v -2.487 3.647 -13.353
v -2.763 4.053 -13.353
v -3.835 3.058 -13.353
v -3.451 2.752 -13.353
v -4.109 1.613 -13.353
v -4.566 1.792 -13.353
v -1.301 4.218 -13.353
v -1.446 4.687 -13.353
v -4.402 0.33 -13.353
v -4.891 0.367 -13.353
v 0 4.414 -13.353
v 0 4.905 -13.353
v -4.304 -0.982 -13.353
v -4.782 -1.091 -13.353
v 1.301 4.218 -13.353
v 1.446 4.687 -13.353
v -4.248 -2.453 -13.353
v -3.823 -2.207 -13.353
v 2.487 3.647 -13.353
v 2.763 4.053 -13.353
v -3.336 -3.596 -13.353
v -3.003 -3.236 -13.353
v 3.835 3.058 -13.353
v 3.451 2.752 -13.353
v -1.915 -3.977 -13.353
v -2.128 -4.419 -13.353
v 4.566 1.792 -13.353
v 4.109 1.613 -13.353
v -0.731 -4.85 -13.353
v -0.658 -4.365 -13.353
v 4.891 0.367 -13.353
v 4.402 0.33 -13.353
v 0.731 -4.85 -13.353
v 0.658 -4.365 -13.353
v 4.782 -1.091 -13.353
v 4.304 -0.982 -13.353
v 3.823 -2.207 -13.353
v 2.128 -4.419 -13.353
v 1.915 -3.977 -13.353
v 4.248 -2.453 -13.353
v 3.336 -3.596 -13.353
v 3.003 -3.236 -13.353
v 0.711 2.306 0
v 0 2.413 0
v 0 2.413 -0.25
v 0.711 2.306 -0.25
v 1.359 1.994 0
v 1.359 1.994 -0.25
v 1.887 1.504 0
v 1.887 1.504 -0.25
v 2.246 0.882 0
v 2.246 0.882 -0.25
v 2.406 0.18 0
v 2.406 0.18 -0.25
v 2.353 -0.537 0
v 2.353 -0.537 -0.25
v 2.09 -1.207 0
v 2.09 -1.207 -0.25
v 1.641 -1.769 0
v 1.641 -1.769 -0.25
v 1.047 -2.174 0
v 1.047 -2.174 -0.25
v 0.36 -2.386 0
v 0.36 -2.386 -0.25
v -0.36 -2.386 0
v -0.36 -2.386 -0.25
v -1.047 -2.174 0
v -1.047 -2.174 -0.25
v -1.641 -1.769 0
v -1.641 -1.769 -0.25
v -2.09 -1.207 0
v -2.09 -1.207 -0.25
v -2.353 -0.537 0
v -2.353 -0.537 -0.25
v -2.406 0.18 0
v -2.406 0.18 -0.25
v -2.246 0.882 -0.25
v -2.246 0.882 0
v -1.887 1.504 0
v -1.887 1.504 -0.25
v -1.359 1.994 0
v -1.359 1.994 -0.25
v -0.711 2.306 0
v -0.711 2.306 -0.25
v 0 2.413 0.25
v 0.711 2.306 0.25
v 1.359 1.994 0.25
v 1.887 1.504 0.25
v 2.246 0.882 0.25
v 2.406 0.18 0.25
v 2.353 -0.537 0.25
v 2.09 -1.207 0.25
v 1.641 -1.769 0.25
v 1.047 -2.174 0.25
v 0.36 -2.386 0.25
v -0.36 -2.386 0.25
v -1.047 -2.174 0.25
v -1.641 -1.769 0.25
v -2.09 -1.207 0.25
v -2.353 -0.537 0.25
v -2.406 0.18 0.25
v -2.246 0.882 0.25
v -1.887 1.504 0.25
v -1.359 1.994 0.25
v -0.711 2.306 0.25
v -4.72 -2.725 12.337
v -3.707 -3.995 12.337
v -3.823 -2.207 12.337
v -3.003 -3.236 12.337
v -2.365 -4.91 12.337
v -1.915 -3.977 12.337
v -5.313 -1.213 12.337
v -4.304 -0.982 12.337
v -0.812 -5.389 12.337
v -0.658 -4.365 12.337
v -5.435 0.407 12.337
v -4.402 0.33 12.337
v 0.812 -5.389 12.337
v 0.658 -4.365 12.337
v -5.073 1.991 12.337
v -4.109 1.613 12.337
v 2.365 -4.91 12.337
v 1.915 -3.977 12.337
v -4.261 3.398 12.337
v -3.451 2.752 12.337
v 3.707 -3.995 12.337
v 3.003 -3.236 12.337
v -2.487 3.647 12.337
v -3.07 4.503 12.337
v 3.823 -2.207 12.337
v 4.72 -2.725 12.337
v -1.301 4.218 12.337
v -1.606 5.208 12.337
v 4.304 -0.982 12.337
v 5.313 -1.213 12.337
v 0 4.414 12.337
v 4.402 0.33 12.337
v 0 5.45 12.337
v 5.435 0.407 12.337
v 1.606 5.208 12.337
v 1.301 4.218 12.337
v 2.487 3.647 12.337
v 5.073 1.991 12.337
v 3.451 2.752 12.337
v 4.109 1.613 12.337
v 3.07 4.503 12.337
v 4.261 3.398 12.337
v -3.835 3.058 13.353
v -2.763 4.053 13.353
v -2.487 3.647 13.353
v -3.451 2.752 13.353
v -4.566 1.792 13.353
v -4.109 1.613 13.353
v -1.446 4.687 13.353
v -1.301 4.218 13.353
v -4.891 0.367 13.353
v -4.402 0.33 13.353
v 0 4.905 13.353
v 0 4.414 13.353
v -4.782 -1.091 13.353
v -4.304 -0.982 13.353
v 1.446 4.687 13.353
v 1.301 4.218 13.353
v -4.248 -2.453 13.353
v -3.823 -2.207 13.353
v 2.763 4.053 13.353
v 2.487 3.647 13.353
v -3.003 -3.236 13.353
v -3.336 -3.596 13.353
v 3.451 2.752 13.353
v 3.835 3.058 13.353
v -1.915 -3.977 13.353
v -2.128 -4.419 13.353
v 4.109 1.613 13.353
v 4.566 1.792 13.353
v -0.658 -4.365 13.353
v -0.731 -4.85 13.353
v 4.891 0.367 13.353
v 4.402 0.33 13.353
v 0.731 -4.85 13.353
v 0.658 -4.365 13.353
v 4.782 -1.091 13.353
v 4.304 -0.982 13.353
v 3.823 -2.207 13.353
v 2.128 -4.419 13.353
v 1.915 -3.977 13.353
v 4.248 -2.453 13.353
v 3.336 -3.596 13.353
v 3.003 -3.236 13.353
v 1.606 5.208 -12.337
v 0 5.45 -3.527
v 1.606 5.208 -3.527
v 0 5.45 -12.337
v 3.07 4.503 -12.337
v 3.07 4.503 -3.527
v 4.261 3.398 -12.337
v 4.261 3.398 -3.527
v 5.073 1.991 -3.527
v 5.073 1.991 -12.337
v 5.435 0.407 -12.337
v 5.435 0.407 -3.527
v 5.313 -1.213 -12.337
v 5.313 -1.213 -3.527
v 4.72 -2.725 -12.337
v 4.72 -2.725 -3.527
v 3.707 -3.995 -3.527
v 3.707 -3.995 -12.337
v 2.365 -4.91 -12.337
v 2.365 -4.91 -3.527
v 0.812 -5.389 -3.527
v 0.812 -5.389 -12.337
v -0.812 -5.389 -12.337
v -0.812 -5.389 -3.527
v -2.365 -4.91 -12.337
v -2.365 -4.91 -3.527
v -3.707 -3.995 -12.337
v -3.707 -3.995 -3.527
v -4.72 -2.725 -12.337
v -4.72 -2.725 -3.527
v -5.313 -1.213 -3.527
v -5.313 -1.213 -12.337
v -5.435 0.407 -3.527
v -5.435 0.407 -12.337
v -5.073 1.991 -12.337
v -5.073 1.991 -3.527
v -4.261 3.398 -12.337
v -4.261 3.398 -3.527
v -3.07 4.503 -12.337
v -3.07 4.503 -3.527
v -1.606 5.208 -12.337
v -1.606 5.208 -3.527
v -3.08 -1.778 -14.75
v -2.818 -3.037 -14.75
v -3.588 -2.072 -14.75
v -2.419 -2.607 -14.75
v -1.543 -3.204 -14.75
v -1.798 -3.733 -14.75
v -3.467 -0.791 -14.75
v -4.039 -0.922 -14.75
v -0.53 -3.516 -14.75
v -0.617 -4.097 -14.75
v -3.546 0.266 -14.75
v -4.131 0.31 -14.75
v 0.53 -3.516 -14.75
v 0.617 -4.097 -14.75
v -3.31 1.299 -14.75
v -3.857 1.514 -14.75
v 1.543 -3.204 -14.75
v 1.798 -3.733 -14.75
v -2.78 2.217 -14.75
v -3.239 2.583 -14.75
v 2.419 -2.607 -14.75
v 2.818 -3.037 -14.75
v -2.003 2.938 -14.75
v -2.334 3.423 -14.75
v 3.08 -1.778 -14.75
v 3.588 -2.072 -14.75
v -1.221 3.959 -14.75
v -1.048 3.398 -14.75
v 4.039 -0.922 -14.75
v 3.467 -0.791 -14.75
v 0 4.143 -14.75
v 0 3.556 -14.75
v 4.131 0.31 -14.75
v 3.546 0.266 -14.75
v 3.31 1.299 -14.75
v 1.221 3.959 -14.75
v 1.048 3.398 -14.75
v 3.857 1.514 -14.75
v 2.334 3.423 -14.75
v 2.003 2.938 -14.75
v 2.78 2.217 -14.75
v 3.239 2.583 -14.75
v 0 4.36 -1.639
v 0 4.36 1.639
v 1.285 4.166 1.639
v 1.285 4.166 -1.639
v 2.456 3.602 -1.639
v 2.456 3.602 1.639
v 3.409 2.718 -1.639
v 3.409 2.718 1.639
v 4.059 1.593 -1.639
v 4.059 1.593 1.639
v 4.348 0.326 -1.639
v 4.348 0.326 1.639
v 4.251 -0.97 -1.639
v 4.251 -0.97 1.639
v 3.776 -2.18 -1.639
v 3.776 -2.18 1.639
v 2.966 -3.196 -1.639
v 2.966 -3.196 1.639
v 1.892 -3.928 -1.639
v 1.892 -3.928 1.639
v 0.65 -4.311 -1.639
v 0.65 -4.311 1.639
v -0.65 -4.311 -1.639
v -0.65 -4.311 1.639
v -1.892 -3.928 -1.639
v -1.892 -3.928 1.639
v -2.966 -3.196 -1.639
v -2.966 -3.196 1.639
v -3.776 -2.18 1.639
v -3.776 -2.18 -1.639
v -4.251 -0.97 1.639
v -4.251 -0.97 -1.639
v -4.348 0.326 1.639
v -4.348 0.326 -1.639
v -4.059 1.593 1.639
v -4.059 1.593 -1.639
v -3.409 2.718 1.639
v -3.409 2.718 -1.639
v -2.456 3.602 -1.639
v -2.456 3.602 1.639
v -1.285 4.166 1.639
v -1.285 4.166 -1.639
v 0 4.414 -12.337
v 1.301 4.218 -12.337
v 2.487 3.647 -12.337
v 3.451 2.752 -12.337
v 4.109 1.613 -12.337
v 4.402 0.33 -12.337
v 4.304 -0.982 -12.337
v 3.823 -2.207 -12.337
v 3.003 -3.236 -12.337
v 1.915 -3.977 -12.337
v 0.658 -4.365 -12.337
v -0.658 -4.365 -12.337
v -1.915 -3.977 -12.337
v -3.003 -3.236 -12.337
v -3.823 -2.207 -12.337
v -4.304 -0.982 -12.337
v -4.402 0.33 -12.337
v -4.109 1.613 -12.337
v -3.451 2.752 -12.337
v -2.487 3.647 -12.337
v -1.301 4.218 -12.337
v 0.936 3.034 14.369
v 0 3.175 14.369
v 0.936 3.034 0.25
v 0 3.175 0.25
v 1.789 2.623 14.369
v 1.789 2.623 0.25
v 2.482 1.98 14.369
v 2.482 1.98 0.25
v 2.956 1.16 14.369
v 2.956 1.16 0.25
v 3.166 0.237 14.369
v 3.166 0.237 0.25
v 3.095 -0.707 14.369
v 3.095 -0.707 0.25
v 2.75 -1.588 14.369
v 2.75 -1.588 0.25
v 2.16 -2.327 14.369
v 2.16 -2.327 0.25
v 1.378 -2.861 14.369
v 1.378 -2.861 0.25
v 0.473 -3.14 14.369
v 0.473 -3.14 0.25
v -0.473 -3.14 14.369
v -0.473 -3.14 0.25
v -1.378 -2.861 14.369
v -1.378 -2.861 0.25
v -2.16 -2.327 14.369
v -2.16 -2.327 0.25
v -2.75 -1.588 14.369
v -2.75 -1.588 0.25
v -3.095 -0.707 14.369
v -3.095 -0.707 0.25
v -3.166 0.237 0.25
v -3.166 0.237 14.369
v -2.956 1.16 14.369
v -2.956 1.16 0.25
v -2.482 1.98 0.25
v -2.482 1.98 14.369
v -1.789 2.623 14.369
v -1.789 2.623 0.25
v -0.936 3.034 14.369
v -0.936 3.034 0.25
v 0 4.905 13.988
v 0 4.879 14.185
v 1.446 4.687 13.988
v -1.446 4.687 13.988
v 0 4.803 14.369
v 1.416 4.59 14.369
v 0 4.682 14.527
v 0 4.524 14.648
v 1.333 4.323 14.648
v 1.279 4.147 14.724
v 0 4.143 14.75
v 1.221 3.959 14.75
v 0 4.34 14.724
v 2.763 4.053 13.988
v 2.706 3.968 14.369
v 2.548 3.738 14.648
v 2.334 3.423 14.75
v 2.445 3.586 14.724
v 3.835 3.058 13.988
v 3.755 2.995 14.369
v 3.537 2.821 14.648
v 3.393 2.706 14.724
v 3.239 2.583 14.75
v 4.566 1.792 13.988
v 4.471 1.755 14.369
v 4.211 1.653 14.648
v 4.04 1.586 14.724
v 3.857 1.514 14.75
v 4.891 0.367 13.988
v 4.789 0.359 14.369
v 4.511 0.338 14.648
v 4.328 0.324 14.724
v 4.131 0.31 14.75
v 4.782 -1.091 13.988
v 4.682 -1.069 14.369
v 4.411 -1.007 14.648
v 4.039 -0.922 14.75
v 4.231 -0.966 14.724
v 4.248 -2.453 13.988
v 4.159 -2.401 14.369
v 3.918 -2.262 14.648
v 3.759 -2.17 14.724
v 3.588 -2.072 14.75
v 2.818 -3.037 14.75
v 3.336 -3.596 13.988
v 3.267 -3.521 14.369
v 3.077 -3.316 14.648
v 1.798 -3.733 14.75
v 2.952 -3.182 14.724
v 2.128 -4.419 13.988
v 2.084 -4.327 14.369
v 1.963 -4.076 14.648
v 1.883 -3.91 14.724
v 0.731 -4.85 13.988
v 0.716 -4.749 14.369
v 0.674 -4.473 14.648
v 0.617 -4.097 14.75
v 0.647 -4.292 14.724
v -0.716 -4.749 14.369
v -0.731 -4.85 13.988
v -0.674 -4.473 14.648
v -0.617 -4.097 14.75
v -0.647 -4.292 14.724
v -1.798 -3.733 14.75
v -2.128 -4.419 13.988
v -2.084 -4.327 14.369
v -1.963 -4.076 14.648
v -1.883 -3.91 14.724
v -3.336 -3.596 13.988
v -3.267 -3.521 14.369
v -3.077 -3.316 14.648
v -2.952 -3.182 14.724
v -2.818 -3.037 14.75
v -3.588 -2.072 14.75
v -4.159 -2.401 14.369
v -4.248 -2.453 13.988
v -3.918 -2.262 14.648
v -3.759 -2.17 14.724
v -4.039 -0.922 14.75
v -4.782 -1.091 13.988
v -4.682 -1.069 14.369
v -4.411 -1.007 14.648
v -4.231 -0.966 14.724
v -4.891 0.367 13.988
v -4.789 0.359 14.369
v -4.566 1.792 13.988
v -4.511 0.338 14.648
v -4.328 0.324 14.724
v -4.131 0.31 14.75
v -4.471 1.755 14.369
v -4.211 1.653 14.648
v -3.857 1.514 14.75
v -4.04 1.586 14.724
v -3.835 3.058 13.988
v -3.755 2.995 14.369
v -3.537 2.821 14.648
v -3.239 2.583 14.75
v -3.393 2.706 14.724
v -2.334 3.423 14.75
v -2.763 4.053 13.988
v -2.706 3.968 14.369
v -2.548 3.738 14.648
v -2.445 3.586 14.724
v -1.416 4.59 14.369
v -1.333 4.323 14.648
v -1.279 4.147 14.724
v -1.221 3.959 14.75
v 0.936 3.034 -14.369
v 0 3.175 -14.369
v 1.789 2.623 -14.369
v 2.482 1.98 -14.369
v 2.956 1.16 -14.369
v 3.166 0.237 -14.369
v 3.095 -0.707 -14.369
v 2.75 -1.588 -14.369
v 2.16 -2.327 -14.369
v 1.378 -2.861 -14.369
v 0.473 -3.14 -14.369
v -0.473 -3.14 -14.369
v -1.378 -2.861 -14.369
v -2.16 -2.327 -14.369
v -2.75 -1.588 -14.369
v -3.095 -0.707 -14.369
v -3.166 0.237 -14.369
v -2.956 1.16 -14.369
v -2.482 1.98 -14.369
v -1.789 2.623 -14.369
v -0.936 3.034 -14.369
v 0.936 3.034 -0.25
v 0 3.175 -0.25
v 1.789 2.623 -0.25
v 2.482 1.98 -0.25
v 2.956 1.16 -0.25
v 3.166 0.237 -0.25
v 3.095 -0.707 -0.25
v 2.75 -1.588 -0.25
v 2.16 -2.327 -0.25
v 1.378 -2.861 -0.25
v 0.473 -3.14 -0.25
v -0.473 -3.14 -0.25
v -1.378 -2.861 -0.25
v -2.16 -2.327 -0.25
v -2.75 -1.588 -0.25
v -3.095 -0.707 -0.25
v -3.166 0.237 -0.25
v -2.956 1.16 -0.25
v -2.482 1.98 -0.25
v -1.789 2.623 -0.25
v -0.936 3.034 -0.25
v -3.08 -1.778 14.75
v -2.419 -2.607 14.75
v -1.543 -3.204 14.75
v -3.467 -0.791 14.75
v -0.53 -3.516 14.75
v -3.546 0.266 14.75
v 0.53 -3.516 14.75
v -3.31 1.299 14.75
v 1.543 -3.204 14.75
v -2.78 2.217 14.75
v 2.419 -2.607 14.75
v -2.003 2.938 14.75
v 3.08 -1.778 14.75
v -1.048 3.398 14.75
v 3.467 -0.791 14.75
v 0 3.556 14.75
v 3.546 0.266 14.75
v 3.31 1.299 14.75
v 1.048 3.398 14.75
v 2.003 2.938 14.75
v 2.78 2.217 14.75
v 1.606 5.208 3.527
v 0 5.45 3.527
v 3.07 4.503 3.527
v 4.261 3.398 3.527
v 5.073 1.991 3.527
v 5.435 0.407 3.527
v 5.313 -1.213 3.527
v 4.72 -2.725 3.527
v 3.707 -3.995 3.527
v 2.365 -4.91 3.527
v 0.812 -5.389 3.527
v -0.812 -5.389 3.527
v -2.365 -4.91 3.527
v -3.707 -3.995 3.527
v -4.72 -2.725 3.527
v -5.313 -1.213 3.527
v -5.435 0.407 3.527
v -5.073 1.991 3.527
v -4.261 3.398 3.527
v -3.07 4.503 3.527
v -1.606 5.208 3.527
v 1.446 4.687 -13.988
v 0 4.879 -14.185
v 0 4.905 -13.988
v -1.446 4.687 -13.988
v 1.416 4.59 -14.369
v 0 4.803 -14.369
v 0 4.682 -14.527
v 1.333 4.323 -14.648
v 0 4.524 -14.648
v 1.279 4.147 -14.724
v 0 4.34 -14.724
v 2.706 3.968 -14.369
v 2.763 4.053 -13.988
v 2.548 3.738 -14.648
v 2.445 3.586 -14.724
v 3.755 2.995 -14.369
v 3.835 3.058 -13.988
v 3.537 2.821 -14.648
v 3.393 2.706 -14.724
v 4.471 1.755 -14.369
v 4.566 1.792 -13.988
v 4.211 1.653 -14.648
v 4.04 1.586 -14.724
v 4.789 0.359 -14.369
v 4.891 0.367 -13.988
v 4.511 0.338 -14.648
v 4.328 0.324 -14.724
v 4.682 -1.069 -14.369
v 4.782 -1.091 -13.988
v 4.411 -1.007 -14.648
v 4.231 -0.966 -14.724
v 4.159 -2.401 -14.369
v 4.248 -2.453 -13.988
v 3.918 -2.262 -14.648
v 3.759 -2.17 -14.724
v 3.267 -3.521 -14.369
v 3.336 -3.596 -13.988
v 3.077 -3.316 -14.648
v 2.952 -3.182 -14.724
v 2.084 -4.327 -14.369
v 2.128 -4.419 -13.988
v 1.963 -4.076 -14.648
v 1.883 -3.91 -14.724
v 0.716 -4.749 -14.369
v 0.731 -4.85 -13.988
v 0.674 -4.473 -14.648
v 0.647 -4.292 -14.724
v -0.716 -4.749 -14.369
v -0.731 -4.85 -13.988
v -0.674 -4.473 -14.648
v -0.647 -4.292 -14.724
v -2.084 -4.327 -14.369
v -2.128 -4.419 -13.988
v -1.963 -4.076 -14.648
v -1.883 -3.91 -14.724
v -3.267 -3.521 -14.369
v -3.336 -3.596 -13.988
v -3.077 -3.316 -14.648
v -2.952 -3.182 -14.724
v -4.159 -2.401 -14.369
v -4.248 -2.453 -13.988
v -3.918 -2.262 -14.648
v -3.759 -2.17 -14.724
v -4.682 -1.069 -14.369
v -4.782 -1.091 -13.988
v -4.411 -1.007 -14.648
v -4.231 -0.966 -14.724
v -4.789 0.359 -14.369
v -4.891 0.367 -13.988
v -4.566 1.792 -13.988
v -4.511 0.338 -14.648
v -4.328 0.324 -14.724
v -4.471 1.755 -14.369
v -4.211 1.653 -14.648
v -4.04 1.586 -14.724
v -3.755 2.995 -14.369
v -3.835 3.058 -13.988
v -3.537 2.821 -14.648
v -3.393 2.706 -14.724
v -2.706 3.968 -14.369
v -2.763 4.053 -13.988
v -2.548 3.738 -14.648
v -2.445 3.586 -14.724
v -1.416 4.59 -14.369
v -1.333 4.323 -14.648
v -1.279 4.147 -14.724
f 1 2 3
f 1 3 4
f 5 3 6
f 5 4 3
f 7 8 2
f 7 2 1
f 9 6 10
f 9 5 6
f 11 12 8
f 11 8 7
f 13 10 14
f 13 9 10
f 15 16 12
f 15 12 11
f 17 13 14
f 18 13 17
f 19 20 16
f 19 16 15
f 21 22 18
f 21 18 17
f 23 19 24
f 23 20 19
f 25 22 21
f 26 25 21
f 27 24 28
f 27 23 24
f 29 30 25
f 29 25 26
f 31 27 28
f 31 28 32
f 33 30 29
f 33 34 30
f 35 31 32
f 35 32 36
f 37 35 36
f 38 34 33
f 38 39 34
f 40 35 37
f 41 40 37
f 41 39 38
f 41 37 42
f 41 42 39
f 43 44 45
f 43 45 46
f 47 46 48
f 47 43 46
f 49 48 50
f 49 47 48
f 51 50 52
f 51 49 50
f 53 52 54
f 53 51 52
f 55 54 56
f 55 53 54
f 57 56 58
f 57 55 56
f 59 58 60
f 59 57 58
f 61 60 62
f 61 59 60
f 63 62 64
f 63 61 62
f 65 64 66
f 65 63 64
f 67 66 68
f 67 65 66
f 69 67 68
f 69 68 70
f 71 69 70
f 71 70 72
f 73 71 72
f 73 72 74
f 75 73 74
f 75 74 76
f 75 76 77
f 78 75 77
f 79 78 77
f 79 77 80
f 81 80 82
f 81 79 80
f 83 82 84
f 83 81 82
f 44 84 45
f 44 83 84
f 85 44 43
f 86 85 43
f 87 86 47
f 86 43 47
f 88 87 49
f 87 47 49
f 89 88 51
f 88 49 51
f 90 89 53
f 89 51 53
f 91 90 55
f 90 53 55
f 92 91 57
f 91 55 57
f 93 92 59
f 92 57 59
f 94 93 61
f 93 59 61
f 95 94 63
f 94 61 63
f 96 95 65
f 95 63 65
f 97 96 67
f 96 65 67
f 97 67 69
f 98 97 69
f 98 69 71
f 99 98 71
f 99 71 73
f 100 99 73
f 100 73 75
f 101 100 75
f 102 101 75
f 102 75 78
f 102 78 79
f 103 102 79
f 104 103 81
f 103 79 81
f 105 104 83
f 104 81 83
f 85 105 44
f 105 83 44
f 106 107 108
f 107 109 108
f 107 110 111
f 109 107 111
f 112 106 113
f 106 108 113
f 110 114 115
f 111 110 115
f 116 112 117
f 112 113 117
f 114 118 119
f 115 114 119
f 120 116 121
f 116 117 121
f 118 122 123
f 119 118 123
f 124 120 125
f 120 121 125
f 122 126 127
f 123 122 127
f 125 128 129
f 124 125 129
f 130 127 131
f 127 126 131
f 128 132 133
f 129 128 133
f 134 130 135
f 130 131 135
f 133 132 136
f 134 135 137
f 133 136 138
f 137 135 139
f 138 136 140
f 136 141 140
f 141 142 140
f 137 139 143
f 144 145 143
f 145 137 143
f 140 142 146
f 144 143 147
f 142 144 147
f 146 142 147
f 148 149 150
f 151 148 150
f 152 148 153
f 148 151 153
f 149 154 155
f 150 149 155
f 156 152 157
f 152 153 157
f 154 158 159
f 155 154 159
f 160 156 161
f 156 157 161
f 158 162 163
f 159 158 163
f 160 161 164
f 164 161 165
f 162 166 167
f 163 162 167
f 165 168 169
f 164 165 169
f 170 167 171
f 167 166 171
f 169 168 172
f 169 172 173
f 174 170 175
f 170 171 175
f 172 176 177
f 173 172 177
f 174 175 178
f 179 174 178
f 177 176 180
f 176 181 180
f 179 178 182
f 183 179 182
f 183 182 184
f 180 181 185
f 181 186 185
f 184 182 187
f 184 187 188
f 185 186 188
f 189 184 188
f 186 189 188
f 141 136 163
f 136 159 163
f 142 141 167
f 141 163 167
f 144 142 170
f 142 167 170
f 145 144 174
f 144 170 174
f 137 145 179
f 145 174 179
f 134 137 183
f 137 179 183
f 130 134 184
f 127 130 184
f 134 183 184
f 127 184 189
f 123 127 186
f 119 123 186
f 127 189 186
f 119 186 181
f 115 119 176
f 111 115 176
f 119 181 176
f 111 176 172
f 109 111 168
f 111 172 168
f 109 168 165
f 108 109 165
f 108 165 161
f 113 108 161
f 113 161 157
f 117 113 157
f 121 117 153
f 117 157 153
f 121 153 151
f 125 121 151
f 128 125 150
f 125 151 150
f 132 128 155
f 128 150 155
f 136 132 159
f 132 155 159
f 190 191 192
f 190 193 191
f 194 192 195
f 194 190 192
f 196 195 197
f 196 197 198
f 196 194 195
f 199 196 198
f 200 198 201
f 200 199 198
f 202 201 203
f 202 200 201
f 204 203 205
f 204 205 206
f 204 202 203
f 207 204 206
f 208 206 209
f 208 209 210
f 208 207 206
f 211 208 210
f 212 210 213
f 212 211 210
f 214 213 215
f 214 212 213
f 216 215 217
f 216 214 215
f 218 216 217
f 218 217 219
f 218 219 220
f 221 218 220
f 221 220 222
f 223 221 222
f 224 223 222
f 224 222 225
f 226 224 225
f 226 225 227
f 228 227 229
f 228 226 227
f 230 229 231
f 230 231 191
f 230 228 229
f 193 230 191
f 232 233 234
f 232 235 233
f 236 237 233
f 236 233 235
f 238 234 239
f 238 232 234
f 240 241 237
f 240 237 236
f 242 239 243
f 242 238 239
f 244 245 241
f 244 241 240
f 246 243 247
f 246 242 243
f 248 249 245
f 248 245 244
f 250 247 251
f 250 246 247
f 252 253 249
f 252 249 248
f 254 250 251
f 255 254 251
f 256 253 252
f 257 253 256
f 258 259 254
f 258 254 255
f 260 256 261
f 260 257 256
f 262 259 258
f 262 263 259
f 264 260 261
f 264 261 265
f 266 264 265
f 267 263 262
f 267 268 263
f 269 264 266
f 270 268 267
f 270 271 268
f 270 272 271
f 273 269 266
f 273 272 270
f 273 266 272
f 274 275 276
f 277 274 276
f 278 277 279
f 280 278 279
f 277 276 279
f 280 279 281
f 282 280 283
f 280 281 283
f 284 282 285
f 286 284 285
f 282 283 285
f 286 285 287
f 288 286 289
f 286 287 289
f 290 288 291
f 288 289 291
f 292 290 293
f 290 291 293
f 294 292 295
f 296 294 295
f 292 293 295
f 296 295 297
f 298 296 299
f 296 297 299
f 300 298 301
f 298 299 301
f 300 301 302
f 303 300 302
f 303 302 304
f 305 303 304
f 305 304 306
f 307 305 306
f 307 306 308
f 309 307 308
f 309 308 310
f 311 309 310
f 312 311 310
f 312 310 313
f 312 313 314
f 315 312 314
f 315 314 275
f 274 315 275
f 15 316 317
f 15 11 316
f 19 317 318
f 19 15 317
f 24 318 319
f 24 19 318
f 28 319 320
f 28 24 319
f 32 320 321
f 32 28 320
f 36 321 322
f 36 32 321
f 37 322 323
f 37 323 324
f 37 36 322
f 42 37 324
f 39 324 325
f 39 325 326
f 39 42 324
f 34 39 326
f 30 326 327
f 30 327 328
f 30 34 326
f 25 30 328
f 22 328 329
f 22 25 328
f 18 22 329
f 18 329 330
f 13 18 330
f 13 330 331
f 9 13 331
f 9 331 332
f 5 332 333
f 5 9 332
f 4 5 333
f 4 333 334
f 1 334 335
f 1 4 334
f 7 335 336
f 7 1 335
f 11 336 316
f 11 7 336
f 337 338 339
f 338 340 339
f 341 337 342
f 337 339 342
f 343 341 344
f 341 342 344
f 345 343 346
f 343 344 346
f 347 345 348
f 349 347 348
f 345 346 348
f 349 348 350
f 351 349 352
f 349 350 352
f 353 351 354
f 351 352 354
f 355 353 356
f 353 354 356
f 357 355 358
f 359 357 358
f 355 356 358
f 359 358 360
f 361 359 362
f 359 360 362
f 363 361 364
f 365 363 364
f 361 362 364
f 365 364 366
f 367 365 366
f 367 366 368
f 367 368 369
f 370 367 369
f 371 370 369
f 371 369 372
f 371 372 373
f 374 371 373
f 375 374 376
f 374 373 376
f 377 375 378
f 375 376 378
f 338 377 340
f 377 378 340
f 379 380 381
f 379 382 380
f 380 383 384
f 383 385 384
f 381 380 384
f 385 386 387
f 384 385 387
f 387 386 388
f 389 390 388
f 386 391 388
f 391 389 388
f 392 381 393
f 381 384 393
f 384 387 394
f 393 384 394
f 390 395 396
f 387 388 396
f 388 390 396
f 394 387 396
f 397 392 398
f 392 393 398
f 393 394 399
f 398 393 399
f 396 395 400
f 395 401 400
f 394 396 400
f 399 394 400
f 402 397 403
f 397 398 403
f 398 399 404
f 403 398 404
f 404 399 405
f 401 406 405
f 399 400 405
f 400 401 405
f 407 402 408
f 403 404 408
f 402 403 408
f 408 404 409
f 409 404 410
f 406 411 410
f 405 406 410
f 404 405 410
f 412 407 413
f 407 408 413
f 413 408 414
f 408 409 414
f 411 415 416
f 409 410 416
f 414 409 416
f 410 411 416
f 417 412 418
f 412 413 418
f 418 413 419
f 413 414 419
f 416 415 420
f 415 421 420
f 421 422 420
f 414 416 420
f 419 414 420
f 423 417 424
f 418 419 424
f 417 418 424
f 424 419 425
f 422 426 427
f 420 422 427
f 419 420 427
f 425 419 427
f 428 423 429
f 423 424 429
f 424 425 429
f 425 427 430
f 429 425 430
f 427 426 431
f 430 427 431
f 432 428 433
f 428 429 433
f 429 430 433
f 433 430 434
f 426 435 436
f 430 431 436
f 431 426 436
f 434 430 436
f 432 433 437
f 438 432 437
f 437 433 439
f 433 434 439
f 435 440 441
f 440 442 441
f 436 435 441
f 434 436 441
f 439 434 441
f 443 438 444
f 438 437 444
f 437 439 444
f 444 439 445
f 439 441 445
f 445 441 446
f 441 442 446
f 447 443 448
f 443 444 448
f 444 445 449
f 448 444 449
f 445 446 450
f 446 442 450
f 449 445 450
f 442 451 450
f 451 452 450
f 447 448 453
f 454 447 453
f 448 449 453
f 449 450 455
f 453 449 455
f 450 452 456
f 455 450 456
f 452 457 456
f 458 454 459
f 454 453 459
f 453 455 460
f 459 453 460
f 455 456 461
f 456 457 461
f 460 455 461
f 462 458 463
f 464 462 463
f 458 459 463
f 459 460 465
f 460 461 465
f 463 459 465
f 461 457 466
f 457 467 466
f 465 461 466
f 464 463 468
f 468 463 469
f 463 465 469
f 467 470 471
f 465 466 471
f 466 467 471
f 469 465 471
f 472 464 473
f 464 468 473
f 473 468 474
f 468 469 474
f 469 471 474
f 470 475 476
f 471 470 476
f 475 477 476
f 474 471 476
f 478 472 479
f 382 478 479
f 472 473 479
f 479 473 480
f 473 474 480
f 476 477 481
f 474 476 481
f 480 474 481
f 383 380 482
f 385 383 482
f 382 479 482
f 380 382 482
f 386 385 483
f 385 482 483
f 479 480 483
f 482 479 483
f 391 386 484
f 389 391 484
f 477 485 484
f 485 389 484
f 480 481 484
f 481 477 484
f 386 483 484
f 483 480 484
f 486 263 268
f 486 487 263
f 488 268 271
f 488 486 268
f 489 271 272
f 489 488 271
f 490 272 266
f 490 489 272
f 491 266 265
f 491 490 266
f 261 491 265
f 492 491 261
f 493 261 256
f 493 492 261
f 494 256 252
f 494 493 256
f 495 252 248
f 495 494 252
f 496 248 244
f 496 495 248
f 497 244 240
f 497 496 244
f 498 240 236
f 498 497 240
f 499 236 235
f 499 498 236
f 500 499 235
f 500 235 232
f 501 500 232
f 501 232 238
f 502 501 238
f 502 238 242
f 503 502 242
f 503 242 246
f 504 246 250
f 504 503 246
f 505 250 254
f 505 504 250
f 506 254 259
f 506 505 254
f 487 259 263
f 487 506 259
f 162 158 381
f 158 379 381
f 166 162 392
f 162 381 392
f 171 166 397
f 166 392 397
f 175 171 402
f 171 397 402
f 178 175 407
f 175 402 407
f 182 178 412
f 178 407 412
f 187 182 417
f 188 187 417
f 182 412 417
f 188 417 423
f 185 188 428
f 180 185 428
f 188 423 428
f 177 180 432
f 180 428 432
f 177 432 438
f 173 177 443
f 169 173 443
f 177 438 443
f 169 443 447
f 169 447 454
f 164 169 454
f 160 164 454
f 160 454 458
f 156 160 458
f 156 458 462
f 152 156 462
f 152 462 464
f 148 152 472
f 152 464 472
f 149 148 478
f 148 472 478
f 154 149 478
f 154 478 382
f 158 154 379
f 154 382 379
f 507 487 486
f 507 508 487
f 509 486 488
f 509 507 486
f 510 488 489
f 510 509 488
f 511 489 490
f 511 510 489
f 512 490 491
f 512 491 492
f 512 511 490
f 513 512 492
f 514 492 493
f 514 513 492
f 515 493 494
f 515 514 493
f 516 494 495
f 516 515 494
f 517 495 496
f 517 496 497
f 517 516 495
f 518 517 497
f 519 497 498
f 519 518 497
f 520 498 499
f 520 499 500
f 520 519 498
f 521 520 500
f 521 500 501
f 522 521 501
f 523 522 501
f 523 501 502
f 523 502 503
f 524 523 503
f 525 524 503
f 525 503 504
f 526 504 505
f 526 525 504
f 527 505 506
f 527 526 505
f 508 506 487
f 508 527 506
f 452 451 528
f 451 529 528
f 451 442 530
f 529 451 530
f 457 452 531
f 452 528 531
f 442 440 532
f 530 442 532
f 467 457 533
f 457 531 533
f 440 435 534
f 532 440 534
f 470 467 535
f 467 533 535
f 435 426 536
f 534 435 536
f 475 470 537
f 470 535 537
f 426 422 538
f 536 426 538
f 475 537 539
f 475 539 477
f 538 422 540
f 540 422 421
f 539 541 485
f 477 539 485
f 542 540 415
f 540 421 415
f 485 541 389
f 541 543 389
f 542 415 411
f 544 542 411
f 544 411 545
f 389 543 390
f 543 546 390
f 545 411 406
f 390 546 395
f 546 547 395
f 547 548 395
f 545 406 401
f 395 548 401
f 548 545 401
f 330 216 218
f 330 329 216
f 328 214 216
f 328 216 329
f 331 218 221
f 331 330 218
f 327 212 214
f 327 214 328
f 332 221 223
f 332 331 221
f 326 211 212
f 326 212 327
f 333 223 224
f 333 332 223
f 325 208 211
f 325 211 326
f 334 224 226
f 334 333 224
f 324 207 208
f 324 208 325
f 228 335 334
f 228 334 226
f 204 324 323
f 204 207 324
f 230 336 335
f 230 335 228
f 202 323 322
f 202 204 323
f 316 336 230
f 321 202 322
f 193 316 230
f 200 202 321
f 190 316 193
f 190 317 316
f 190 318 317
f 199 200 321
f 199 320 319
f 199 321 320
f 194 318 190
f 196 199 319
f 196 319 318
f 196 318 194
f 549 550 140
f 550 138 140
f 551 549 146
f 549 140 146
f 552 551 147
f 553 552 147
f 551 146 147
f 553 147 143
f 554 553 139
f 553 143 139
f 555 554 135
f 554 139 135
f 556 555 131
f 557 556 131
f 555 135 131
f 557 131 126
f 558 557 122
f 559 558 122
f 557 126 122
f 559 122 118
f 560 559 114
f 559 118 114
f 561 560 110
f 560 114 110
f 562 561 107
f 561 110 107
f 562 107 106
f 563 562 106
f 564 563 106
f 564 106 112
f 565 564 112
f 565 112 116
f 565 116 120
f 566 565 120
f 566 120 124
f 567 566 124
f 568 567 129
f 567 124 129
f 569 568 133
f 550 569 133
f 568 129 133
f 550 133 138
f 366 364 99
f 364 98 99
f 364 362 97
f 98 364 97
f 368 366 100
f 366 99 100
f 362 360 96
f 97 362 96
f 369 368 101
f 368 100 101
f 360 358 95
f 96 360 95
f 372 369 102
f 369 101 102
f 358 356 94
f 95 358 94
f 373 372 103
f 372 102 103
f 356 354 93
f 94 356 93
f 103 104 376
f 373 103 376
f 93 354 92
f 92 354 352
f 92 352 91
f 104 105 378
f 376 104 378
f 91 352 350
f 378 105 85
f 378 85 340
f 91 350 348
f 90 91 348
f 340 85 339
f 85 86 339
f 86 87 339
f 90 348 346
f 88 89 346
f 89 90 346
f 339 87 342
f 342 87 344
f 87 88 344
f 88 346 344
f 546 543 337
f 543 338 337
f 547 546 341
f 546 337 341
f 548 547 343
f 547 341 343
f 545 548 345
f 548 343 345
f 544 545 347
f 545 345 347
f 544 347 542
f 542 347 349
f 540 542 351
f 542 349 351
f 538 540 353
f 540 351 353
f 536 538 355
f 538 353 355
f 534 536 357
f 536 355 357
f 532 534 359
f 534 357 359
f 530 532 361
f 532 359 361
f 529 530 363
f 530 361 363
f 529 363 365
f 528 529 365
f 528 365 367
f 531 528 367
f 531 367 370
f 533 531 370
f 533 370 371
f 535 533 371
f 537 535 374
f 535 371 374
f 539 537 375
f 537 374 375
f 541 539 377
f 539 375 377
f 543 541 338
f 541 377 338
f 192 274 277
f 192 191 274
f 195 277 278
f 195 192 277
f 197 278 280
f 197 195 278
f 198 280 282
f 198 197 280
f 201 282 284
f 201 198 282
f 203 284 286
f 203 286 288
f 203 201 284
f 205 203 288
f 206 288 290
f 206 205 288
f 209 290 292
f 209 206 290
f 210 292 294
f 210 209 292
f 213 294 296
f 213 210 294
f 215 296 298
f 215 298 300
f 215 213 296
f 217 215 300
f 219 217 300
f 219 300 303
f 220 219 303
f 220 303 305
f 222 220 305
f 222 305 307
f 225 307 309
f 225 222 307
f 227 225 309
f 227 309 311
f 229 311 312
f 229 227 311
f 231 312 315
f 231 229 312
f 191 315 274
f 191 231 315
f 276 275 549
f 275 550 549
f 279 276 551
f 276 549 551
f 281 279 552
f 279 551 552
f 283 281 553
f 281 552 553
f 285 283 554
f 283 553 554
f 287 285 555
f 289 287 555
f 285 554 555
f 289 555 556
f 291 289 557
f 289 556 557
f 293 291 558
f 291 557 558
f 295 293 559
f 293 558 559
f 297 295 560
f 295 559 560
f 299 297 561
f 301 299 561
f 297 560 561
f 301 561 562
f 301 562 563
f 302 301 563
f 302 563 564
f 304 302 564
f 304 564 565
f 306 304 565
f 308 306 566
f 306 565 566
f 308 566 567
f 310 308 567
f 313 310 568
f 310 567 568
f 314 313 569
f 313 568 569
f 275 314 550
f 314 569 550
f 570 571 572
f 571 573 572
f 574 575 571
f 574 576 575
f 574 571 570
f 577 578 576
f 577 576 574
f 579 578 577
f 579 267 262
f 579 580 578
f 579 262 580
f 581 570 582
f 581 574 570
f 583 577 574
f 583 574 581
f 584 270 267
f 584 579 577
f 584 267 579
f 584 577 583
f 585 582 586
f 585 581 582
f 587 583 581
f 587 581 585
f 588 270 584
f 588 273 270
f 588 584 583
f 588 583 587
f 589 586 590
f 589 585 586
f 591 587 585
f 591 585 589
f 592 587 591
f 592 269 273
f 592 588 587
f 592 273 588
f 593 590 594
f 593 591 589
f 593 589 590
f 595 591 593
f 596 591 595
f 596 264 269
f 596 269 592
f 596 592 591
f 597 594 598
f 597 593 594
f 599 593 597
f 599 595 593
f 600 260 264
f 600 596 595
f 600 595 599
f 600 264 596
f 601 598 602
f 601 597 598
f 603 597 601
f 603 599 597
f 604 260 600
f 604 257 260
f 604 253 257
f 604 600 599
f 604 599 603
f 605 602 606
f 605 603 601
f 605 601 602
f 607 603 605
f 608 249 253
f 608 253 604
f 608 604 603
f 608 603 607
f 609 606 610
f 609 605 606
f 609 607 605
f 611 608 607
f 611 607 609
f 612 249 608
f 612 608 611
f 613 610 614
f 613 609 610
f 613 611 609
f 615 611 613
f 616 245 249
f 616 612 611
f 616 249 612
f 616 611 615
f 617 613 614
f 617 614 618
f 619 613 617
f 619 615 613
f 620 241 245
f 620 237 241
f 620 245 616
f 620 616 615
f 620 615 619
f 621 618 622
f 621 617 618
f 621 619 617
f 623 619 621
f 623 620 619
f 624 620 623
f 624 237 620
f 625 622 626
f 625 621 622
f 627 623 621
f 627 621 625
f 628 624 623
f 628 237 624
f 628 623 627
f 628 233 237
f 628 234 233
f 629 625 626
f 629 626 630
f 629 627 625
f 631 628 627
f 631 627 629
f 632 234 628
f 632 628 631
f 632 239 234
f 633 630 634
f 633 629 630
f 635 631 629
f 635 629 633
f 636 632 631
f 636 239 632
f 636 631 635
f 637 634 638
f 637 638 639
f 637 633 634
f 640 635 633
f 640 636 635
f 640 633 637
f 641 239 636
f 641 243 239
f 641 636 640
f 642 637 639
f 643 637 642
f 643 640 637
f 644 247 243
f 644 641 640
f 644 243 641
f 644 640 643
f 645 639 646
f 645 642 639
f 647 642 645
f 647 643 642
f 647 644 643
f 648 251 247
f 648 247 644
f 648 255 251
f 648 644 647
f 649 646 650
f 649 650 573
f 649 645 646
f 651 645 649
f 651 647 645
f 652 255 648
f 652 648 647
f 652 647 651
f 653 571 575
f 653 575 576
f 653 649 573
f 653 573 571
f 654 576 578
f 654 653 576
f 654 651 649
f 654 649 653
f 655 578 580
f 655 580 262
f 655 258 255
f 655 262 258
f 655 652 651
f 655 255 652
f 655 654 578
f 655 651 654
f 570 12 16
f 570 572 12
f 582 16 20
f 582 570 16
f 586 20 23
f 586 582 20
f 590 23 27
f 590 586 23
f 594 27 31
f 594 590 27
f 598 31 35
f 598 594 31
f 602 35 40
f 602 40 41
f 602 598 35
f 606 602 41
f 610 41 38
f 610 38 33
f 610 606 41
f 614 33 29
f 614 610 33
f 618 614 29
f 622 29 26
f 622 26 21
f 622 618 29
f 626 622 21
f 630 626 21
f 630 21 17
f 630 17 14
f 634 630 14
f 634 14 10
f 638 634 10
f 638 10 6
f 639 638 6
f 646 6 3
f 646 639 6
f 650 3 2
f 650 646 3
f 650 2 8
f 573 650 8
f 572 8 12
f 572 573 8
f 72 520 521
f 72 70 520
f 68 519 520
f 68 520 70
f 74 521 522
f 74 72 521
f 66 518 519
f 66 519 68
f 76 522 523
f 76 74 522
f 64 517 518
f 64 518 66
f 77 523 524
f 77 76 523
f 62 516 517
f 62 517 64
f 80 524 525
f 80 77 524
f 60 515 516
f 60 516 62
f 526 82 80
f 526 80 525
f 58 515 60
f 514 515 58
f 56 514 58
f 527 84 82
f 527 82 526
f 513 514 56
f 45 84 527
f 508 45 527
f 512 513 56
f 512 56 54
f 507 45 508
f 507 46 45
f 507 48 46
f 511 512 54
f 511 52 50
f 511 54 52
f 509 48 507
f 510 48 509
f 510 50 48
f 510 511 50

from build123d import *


with BuildPart() as part:
    # Sketch1 → Revolve1 (revolve)
    with BuildSketch(Plane(origin=(0, 0, 0), x_dir=(0, 0, -1), z_dir=(1, 0, 0))):
        with BuildLine():
            Line((13.353, 4.905), (13.988, 4.905))
            ThreePointArc((13.988, 4.905), (14.526815367, 4.681815367), (14.75, 4.143))
            Line((14.75, 4.143), (14.75, 3.556))
            Line((14.75, 3.556), (14.369, 3.175))
            Line((14.369, 3.175), (0.25, 3.175))
            Line((0.25, 3.175), (0.25, 2.413))
            Line((0.25, 2.413), (0, 2.413))
            Line((0, 2.413), (0, 4.36))
            Line((0, 4.36), (1.638888889, 4.36))
            Line((1.638888889, 4.36), (3.526824269, 5.45))
            Line((3.526824269, 5.45), (12.337, 5.45))
            Line((12.337, 5.45), (12.337, 4.4145))
            Line((12.337, 4.4145), (13.353, 4.4145))
            Line((13.353, 4.4145), (13.353, 4.905))
        make_face()
    revolve1 = revolve(axis=Axis((0, 0, 0), (0, 0, -1)))

    # Mirror1: Revolve1 across plane
    add(revolve1.mirror(Plane.XY))


solid = part.part
